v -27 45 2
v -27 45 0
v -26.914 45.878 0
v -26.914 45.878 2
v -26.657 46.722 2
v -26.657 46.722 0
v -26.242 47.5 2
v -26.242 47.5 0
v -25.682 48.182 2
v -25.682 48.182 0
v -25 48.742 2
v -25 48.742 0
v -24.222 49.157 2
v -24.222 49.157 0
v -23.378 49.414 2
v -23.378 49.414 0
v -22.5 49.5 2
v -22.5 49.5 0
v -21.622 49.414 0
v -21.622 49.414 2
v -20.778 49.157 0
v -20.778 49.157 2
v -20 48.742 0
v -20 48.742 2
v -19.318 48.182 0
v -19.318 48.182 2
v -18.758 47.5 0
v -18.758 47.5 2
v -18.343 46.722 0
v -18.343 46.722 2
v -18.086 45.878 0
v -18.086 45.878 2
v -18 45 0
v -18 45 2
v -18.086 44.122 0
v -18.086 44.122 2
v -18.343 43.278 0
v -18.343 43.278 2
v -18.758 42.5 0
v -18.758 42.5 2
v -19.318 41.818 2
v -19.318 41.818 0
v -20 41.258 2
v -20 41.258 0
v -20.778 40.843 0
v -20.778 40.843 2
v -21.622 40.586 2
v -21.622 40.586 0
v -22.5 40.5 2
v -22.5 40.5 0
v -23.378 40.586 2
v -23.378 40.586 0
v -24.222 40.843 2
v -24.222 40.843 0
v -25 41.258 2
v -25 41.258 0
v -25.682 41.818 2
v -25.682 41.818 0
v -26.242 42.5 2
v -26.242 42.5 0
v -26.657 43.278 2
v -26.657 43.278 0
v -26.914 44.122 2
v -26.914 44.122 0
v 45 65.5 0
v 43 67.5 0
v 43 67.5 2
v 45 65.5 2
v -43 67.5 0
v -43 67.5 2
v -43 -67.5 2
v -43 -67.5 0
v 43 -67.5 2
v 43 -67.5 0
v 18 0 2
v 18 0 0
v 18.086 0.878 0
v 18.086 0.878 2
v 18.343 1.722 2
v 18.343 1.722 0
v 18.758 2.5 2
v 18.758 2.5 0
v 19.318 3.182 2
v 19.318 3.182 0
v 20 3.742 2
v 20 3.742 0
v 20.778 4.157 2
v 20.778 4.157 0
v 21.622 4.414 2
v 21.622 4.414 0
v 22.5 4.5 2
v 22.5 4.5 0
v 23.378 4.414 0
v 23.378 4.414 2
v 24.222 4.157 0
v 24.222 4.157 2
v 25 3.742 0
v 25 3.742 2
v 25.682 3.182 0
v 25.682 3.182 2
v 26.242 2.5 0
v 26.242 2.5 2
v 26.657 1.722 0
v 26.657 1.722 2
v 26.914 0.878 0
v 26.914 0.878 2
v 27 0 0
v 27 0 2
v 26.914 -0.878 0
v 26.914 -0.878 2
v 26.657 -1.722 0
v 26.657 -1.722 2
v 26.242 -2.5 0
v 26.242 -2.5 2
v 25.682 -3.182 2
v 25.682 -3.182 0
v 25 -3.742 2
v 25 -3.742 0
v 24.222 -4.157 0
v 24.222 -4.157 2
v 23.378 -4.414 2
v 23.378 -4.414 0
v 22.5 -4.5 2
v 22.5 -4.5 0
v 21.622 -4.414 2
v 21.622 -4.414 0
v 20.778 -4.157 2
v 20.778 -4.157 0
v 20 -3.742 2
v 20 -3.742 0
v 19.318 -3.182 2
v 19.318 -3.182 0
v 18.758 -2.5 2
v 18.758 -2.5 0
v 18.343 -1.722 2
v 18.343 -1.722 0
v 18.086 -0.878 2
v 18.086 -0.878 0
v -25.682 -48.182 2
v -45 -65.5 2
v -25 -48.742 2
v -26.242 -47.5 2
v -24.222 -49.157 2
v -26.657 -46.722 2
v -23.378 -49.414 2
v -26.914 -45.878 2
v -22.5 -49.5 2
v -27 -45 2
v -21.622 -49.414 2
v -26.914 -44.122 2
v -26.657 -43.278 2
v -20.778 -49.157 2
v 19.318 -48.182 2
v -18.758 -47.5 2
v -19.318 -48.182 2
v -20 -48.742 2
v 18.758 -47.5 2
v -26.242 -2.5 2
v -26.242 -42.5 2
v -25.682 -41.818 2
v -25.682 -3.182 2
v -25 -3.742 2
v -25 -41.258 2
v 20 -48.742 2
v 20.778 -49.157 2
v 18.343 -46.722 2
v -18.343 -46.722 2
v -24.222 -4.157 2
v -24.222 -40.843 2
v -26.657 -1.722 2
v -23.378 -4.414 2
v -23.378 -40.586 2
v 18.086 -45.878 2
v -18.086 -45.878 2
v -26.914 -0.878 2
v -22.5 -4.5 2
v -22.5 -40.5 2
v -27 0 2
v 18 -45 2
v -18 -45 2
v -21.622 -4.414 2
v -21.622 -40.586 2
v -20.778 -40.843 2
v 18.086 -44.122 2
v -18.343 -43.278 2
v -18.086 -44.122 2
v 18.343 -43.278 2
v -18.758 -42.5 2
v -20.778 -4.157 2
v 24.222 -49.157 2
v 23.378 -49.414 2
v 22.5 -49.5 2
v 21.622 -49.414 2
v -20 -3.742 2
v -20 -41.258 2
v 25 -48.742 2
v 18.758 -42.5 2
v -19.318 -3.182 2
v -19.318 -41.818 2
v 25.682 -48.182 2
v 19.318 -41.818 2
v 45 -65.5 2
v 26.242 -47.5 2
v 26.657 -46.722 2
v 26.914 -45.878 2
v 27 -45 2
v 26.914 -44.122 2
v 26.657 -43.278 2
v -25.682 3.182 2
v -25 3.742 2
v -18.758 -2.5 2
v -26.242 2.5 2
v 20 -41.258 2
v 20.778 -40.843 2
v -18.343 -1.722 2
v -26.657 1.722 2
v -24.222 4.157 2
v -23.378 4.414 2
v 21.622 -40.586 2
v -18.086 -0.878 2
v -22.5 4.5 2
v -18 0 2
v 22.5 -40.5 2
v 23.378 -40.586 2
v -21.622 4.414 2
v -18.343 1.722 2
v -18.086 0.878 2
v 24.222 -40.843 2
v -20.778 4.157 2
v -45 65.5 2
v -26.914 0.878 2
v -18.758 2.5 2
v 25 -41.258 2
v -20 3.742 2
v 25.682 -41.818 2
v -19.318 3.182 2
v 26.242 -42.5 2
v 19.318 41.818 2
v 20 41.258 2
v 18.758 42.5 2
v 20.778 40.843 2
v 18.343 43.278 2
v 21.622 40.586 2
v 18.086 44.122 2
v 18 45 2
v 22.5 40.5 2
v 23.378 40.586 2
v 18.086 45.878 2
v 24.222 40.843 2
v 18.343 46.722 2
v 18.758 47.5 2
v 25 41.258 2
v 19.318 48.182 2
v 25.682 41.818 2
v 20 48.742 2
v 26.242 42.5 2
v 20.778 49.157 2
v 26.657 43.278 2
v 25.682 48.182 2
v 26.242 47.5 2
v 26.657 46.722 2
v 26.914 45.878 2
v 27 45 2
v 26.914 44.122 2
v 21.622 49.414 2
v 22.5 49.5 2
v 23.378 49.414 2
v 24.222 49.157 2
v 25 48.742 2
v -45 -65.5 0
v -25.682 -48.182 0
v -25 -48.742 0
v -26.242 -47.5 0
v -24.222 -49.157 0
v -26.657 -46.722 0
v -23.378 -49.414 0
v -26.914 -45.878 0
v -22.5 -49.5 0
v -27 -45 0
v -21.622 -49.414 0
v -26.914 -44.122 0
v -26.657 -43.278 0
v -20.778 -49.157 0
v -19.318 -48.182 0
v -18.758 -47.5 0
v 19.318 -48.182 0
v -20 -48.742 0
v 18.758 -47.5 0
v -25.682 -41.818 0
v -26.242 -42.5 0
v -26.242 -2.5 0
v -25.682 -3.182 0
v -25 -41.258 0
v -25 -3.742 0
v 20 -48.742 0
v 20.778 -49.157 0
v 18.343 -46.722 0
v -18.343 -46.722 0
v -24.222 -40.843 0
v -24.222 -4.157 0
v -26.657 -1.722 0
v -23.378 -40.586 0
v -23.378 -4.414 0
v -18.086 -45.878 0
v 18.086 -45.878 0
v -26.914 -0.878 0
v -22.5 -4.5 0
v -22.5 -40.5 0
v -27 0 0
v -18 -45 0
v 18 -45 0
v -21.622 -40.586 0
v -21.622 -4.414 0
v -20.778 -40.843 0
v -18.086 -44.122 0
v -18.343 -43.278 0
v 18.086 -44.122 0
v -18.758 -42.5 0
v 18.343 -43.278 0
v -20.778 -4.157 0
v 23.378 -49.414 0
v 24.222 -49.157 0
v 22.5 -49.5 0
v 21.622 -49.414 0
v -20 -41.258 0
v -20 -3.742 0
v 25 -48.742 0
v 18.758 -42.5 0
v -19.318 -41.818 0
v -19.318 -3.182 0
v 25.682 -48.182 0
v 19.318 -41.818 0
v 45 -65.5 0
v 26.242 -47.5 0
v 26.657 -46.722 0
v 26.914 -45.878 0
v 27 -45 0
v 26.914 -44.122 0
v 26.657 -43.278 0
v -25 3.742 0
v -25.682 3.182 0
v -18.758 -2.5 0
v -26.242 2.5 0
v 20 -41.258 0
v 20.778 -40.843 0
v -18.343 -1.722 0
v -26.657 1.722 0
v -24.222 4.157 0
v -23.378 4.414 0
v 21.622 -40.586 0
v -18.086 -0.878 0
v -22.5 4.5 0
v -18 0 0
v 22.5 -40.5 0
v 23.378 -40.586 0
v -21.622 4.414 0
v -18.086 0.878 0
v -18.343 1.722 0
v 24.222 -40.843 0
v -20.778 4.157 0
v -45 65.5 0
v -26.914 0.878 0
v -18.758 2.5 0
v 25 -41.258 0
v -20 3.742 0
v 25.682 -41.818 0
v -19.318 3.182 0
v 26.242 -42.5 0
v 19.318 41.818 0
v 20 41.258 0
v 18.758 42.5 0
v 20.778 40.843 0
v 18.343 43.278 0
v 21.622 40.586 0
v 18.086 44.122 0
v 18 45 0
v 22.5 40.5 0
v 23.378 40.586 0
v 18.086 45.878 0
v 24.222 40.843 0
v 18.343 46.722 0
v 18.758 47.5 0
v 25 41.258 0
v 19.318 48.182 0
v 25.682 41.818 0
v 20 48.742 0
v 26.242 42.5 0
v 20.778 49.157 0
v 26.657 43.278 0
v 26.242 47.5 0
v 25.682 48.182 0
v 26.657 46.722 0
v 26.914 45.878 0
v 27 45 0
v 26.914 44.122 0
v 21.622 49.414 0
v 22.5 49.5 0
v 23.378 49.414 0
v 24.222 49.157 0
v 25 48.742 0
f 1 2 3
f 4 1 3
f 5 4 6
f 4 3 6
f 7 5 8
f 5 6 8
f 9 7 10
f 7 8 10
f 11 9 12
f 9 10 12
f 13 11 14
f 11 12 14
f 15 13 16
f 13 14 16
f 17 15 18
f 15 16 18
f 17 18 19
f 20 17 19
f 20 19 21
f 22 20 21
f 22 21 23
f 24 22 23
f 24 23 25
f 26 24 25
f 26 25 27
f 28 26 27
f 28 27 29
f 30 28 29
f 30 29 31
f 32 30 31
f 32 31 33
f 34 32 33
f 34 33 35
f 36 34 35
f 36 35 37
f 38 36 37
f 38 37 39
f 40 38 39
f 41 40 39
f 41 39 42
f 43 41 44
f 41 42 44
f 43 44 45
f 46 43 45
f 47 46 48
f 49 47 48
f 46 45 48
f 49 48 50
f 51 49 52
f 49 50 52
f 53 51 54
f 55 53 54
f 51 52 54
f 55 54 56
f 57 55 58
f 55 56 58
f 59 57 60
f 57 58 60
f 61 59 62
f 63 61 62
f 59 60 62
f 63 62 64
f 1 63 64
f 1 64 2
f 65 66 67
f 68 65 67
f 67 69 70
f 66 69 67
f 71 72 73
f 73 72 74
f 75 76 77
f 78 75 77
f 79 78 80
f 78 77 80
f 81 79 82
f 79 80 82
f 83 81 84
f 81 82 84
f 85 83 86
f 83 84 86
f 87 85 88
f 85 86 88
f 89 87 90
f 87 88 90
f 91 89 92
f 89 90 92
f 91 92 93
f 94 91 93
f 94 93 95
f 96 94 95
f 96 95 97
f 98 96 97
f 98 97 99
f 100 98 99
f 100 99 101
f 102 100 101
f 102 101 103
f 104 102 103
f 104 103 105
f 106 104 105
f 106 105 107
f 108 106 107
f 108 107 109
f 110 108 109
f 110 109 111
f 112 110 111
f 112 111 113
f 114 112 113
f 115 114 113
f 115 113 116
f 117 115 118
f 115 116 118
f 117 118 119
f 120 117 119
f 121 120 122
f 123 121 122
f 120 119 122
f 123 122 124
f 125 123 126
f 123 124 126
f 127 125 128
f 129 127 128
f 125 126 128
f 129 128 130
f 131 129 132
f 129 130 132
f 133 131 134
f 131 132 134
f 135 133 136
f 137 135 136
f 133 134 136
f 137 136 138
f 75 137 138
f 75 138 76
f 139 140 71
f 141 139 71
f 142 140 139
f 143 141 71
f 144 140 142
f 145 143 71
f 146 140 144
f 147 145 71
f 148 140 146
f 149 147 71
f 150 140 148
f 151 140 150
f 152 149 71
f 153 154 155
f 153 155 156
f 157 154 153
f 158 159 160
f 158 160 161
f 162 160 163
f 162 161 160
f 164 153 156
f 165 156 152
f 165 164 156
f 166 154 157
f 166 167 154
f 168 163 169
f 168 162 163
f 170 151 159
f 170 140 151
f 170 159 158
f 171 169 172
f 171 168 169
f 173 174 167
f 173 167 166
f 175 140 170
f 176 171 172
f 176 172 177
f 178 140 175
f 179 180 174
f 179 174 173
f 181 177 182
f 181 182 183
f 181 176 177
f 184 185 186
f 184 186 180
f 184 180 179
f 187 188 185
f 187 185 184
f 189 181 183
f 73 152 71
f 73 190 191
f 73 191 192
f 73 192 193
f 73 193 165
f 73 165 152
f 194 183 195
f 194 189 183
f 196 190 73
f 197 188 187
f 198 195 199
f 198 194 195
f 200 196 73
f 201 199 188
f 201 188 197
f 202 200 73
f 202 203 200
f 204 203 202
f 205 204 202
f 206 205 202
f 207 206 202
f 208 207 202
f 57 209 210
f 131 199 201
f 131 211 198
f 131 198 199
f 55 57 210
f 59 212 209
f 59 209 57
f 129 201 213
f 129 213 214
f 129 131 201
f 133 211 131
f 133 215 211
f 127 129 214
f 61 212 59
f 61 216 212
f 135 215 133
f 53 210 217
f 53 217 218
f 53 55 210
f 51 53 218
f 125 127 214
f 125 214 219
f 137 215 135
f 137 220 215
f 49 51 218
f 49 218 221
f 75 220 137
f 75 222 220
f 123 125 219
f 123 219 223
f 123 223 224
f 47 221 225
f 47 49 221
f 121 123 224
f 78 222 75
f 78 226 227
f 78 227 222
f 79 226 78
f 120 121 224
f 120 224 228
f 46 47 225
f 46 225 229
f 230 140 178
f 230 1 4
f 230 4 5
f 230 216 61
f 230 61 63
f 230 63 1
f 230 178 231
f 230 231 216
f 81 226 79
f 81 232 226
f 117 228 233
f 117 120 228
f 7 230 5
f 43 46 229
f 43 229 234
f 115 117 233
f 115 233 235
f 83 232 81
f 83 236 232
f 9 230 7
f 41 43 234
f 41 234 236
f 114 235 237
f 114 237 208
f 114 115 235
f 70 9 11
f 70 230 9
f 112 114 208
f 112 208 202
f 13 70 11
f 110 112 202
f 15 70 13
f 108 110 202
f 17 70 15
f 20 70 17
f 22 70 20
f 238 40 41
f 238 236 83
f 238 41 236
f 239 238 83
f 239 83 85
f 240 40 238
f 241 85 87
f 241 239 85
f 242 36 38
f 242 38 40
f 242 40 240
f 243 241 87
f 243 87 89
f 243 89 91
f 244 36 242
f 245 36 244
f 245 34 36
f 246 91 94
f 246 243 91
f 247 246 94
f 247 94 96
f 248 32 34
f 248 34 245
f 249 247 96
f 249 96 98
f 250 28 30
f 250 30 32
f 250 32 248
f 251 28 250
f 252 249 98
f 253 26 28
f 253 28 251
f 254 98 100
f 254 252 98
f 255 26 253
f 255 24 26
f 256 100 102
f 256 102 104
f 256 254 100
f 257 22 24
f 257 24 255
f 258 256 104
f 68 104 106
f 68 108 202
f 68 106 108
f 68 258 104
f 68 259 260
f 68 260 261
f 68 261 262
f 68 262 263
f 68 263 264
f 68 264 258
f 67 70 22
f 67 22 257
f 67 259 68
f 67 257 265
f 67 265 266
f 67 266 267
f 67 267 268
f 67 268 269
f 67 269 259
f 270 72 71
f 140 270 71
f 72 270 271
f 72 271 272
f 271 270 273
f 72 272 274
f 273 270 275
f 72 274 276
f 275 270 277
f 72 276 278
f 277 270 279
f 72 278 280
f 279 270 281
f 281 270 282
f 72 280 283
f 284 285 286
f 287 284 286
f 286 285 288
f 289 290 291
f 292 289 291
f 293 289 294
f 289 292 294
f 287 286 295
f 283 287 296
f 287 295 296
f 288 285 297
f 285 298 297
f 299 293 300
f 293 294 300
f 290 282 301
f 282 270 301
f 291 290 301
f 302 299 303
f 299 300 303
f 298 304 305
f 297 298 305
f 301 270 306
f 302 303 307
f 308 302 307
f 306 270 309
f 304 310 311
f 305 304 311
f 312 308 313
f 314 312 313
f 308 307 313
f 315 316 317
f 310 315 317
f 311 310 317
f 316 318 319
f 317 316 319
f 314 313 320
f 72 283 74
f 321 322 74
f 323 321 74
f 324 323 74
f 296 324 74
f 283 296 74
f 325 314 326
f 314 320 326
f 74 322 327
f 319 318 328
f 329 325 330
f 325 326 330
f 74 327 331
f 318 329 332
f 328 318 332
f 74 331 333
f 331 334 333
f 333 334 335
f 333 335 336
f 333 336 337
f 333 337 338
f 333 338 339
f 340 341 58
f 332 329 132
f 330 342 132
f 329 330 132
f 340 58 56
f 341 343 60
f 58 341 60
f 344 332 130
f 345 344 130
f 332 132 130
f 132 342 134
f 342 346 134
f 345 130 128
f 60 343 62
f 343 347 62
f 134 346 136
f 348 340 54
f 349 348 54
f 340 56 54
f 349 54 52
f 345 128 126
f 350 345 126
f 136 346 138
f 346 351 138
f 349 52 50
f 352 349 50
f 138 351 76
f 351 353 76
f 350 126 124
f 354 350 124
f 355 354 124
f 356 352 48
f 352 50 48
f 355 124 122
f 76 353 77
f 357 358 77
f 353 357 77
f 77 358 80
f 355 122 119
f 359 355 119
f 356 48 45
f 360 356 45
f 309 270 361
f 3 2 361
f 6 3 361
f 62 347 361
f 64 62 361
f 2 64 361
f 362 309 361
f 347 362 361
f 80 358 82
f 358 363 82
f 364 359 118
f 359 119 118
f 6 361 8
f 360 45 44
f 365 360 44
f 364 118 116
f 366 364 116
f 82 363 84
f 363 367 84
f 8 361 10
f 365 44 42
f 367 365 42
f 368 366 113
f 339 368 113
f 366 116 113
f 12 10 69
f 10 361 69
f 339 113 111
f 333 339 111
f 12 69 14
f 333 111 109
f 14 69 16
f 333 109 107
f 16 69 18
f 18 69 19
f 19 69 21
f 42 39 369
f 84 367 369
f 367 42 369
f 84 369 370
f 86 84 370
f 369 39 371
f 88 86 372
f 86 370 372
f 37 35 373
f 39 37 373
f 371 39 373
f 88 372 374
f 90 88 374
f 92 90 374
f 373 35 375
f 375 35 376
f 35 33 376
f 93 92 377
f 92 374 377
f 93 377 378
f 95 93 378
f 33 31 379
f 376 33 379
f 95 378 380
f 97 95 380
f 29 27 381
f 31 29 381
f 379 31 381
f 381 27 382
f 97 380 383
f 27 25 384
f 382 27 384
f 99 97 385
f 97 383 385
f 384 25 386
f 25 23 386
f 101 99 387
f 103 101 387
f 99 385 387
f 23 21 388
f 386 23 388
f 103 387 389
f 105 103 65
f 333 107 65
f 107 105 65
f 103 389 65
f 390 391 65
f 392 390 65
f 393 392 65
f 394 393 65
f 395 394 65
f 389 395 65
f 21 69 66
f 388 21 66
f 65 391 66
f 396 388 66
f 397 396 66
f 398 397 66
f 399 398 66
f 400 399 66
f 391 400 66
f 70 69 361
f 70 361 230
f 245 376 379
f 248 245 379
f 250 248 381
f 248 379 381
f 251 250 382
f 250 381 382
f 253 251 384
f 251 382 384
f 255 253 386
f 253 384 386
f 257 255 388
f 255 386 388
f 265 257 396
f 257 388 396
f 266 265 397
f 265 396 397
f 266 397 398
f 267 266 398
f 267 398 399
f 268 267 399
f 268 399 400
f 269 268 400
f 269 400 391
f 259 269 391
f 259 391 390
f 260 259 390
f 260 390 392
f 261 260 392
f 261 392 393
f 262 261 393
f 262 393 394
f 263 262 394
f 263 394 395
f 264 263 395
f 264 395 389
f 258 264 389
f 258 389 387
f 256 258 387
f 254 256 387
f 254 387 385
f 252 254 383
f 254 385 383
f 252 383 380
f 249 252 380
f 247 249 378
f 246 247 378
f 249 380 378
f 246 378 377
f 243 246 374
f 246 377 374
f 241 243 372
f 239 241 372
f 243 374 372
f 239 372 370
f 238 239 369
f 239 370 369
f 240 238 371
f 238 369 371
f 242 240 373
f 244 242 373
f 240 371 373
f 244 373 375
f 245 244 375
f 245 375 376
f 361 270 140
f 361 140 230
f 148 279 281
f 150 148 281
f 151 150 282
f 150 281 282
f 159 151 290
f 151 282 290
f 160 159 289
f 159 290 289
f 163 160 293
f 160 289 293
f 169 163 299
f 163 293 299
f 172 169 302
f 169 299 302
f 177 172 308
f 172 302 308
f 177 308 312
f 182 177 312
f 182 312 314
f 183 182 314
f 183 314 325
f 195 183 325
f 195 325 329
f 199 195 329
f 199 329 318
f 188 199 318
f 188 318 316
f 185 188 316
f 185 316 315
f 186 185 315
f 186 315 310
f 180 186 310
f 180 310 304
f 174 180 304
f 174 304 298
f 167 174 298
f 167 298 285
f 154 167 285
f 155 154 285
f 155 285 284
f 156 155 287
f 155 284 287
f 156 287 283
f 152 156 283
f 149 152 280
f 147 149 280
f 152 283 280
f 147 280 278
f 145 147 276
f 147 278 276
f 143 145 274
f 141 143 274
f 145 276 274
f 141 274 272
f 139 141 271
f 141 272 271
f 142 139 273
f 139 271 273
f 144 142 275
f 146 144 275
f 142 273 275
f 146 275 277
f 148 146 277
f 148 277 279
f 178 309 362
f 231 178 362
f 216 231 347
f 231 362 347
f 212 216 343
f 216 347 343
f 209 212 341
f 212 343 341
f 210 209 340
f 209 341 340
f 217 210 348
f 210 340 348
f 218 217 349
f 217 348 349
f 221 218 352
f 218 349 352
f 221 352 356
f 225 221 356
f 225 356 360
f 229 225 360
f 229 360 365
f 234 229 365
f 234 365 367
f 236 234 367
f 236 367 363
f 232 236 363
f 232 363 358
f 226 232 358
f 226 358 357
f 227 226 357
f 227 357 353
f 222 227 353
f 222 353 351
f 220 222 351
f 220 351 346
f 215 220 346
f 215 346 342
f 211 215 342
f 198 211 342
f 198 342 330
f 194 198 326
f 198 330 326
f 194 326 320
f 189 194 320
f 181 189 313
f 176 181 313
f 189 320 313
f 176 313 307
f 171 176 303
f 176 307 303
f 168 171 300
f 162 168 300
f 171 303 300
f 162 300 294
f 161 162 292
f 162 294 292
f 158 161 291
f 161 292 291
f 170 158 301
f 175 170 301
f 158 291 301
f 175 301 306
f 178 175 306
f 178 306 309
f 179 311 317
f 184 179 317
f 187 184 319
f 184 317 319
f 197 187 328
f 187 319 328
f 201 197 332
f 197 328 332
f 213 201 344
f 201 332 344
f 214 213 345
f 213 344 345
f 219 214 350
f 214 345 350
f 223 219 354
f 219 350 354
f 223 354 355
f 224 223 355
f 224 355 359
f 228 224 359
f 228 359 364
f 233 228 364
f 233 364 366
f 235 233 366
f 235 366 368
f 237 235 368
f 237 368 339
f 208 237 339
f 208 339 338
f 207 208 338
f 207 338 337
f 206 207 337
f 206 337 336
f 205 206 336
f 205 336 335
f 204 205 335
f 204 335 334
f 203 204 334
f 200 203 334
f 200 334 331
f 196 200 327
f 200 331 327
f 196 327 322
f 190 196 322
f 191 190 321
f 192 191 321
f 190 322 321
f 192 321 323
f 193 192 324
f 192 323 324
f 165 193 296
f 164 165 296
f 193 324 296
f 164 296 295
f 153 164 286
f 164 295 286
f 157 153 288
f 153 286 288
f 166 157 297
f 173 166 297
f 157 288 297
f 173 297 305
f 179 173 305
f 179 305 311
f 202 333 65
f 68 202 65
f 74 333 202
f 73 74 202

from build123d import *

# Parameters (mm, degrees)
SKETCH_1_W        = 90
SKETCH_1_H        = 135
EXTRUDE_1_DEPTH   = 2
CHAMFER_1_SIZE    = 2
HOLE_WIZARD_M81_D = 9


with BuildPart() as part:
    # Эскиз1 → Бобышка-Вытянуть1 (new body)
    with BuildSketch(Plane.XY):
        Rectangle(SKETCH_1_W, SKETCH_1_H)
    extrude(amount=EXTRUDE_1_DEPTH)

    # Фаска1
    chamfer_1_edges = [part.edges().sort_by_distance(p)[0] for p in [
        (45, -67.5, 1),
        (-45, -67.5, 1),
        (-45, 67.5, 1),
        (45, 67.5, 1),
    ]]
    chamfer(chamfer_1_edges, length=CHAMFER_1_SIZE)

    # Отверстие с зазором M81 (through all)
    with Locations(Plane.XY.offset(2)):
        with Locations((-22.5, 45), (22.5, 45), (22.5, 0), (-22.5, 0), (-22.5, -45), (22.5, -45)):
            Hole(HOLE_WIZARD_M81_D / 2)


solid = part.part
